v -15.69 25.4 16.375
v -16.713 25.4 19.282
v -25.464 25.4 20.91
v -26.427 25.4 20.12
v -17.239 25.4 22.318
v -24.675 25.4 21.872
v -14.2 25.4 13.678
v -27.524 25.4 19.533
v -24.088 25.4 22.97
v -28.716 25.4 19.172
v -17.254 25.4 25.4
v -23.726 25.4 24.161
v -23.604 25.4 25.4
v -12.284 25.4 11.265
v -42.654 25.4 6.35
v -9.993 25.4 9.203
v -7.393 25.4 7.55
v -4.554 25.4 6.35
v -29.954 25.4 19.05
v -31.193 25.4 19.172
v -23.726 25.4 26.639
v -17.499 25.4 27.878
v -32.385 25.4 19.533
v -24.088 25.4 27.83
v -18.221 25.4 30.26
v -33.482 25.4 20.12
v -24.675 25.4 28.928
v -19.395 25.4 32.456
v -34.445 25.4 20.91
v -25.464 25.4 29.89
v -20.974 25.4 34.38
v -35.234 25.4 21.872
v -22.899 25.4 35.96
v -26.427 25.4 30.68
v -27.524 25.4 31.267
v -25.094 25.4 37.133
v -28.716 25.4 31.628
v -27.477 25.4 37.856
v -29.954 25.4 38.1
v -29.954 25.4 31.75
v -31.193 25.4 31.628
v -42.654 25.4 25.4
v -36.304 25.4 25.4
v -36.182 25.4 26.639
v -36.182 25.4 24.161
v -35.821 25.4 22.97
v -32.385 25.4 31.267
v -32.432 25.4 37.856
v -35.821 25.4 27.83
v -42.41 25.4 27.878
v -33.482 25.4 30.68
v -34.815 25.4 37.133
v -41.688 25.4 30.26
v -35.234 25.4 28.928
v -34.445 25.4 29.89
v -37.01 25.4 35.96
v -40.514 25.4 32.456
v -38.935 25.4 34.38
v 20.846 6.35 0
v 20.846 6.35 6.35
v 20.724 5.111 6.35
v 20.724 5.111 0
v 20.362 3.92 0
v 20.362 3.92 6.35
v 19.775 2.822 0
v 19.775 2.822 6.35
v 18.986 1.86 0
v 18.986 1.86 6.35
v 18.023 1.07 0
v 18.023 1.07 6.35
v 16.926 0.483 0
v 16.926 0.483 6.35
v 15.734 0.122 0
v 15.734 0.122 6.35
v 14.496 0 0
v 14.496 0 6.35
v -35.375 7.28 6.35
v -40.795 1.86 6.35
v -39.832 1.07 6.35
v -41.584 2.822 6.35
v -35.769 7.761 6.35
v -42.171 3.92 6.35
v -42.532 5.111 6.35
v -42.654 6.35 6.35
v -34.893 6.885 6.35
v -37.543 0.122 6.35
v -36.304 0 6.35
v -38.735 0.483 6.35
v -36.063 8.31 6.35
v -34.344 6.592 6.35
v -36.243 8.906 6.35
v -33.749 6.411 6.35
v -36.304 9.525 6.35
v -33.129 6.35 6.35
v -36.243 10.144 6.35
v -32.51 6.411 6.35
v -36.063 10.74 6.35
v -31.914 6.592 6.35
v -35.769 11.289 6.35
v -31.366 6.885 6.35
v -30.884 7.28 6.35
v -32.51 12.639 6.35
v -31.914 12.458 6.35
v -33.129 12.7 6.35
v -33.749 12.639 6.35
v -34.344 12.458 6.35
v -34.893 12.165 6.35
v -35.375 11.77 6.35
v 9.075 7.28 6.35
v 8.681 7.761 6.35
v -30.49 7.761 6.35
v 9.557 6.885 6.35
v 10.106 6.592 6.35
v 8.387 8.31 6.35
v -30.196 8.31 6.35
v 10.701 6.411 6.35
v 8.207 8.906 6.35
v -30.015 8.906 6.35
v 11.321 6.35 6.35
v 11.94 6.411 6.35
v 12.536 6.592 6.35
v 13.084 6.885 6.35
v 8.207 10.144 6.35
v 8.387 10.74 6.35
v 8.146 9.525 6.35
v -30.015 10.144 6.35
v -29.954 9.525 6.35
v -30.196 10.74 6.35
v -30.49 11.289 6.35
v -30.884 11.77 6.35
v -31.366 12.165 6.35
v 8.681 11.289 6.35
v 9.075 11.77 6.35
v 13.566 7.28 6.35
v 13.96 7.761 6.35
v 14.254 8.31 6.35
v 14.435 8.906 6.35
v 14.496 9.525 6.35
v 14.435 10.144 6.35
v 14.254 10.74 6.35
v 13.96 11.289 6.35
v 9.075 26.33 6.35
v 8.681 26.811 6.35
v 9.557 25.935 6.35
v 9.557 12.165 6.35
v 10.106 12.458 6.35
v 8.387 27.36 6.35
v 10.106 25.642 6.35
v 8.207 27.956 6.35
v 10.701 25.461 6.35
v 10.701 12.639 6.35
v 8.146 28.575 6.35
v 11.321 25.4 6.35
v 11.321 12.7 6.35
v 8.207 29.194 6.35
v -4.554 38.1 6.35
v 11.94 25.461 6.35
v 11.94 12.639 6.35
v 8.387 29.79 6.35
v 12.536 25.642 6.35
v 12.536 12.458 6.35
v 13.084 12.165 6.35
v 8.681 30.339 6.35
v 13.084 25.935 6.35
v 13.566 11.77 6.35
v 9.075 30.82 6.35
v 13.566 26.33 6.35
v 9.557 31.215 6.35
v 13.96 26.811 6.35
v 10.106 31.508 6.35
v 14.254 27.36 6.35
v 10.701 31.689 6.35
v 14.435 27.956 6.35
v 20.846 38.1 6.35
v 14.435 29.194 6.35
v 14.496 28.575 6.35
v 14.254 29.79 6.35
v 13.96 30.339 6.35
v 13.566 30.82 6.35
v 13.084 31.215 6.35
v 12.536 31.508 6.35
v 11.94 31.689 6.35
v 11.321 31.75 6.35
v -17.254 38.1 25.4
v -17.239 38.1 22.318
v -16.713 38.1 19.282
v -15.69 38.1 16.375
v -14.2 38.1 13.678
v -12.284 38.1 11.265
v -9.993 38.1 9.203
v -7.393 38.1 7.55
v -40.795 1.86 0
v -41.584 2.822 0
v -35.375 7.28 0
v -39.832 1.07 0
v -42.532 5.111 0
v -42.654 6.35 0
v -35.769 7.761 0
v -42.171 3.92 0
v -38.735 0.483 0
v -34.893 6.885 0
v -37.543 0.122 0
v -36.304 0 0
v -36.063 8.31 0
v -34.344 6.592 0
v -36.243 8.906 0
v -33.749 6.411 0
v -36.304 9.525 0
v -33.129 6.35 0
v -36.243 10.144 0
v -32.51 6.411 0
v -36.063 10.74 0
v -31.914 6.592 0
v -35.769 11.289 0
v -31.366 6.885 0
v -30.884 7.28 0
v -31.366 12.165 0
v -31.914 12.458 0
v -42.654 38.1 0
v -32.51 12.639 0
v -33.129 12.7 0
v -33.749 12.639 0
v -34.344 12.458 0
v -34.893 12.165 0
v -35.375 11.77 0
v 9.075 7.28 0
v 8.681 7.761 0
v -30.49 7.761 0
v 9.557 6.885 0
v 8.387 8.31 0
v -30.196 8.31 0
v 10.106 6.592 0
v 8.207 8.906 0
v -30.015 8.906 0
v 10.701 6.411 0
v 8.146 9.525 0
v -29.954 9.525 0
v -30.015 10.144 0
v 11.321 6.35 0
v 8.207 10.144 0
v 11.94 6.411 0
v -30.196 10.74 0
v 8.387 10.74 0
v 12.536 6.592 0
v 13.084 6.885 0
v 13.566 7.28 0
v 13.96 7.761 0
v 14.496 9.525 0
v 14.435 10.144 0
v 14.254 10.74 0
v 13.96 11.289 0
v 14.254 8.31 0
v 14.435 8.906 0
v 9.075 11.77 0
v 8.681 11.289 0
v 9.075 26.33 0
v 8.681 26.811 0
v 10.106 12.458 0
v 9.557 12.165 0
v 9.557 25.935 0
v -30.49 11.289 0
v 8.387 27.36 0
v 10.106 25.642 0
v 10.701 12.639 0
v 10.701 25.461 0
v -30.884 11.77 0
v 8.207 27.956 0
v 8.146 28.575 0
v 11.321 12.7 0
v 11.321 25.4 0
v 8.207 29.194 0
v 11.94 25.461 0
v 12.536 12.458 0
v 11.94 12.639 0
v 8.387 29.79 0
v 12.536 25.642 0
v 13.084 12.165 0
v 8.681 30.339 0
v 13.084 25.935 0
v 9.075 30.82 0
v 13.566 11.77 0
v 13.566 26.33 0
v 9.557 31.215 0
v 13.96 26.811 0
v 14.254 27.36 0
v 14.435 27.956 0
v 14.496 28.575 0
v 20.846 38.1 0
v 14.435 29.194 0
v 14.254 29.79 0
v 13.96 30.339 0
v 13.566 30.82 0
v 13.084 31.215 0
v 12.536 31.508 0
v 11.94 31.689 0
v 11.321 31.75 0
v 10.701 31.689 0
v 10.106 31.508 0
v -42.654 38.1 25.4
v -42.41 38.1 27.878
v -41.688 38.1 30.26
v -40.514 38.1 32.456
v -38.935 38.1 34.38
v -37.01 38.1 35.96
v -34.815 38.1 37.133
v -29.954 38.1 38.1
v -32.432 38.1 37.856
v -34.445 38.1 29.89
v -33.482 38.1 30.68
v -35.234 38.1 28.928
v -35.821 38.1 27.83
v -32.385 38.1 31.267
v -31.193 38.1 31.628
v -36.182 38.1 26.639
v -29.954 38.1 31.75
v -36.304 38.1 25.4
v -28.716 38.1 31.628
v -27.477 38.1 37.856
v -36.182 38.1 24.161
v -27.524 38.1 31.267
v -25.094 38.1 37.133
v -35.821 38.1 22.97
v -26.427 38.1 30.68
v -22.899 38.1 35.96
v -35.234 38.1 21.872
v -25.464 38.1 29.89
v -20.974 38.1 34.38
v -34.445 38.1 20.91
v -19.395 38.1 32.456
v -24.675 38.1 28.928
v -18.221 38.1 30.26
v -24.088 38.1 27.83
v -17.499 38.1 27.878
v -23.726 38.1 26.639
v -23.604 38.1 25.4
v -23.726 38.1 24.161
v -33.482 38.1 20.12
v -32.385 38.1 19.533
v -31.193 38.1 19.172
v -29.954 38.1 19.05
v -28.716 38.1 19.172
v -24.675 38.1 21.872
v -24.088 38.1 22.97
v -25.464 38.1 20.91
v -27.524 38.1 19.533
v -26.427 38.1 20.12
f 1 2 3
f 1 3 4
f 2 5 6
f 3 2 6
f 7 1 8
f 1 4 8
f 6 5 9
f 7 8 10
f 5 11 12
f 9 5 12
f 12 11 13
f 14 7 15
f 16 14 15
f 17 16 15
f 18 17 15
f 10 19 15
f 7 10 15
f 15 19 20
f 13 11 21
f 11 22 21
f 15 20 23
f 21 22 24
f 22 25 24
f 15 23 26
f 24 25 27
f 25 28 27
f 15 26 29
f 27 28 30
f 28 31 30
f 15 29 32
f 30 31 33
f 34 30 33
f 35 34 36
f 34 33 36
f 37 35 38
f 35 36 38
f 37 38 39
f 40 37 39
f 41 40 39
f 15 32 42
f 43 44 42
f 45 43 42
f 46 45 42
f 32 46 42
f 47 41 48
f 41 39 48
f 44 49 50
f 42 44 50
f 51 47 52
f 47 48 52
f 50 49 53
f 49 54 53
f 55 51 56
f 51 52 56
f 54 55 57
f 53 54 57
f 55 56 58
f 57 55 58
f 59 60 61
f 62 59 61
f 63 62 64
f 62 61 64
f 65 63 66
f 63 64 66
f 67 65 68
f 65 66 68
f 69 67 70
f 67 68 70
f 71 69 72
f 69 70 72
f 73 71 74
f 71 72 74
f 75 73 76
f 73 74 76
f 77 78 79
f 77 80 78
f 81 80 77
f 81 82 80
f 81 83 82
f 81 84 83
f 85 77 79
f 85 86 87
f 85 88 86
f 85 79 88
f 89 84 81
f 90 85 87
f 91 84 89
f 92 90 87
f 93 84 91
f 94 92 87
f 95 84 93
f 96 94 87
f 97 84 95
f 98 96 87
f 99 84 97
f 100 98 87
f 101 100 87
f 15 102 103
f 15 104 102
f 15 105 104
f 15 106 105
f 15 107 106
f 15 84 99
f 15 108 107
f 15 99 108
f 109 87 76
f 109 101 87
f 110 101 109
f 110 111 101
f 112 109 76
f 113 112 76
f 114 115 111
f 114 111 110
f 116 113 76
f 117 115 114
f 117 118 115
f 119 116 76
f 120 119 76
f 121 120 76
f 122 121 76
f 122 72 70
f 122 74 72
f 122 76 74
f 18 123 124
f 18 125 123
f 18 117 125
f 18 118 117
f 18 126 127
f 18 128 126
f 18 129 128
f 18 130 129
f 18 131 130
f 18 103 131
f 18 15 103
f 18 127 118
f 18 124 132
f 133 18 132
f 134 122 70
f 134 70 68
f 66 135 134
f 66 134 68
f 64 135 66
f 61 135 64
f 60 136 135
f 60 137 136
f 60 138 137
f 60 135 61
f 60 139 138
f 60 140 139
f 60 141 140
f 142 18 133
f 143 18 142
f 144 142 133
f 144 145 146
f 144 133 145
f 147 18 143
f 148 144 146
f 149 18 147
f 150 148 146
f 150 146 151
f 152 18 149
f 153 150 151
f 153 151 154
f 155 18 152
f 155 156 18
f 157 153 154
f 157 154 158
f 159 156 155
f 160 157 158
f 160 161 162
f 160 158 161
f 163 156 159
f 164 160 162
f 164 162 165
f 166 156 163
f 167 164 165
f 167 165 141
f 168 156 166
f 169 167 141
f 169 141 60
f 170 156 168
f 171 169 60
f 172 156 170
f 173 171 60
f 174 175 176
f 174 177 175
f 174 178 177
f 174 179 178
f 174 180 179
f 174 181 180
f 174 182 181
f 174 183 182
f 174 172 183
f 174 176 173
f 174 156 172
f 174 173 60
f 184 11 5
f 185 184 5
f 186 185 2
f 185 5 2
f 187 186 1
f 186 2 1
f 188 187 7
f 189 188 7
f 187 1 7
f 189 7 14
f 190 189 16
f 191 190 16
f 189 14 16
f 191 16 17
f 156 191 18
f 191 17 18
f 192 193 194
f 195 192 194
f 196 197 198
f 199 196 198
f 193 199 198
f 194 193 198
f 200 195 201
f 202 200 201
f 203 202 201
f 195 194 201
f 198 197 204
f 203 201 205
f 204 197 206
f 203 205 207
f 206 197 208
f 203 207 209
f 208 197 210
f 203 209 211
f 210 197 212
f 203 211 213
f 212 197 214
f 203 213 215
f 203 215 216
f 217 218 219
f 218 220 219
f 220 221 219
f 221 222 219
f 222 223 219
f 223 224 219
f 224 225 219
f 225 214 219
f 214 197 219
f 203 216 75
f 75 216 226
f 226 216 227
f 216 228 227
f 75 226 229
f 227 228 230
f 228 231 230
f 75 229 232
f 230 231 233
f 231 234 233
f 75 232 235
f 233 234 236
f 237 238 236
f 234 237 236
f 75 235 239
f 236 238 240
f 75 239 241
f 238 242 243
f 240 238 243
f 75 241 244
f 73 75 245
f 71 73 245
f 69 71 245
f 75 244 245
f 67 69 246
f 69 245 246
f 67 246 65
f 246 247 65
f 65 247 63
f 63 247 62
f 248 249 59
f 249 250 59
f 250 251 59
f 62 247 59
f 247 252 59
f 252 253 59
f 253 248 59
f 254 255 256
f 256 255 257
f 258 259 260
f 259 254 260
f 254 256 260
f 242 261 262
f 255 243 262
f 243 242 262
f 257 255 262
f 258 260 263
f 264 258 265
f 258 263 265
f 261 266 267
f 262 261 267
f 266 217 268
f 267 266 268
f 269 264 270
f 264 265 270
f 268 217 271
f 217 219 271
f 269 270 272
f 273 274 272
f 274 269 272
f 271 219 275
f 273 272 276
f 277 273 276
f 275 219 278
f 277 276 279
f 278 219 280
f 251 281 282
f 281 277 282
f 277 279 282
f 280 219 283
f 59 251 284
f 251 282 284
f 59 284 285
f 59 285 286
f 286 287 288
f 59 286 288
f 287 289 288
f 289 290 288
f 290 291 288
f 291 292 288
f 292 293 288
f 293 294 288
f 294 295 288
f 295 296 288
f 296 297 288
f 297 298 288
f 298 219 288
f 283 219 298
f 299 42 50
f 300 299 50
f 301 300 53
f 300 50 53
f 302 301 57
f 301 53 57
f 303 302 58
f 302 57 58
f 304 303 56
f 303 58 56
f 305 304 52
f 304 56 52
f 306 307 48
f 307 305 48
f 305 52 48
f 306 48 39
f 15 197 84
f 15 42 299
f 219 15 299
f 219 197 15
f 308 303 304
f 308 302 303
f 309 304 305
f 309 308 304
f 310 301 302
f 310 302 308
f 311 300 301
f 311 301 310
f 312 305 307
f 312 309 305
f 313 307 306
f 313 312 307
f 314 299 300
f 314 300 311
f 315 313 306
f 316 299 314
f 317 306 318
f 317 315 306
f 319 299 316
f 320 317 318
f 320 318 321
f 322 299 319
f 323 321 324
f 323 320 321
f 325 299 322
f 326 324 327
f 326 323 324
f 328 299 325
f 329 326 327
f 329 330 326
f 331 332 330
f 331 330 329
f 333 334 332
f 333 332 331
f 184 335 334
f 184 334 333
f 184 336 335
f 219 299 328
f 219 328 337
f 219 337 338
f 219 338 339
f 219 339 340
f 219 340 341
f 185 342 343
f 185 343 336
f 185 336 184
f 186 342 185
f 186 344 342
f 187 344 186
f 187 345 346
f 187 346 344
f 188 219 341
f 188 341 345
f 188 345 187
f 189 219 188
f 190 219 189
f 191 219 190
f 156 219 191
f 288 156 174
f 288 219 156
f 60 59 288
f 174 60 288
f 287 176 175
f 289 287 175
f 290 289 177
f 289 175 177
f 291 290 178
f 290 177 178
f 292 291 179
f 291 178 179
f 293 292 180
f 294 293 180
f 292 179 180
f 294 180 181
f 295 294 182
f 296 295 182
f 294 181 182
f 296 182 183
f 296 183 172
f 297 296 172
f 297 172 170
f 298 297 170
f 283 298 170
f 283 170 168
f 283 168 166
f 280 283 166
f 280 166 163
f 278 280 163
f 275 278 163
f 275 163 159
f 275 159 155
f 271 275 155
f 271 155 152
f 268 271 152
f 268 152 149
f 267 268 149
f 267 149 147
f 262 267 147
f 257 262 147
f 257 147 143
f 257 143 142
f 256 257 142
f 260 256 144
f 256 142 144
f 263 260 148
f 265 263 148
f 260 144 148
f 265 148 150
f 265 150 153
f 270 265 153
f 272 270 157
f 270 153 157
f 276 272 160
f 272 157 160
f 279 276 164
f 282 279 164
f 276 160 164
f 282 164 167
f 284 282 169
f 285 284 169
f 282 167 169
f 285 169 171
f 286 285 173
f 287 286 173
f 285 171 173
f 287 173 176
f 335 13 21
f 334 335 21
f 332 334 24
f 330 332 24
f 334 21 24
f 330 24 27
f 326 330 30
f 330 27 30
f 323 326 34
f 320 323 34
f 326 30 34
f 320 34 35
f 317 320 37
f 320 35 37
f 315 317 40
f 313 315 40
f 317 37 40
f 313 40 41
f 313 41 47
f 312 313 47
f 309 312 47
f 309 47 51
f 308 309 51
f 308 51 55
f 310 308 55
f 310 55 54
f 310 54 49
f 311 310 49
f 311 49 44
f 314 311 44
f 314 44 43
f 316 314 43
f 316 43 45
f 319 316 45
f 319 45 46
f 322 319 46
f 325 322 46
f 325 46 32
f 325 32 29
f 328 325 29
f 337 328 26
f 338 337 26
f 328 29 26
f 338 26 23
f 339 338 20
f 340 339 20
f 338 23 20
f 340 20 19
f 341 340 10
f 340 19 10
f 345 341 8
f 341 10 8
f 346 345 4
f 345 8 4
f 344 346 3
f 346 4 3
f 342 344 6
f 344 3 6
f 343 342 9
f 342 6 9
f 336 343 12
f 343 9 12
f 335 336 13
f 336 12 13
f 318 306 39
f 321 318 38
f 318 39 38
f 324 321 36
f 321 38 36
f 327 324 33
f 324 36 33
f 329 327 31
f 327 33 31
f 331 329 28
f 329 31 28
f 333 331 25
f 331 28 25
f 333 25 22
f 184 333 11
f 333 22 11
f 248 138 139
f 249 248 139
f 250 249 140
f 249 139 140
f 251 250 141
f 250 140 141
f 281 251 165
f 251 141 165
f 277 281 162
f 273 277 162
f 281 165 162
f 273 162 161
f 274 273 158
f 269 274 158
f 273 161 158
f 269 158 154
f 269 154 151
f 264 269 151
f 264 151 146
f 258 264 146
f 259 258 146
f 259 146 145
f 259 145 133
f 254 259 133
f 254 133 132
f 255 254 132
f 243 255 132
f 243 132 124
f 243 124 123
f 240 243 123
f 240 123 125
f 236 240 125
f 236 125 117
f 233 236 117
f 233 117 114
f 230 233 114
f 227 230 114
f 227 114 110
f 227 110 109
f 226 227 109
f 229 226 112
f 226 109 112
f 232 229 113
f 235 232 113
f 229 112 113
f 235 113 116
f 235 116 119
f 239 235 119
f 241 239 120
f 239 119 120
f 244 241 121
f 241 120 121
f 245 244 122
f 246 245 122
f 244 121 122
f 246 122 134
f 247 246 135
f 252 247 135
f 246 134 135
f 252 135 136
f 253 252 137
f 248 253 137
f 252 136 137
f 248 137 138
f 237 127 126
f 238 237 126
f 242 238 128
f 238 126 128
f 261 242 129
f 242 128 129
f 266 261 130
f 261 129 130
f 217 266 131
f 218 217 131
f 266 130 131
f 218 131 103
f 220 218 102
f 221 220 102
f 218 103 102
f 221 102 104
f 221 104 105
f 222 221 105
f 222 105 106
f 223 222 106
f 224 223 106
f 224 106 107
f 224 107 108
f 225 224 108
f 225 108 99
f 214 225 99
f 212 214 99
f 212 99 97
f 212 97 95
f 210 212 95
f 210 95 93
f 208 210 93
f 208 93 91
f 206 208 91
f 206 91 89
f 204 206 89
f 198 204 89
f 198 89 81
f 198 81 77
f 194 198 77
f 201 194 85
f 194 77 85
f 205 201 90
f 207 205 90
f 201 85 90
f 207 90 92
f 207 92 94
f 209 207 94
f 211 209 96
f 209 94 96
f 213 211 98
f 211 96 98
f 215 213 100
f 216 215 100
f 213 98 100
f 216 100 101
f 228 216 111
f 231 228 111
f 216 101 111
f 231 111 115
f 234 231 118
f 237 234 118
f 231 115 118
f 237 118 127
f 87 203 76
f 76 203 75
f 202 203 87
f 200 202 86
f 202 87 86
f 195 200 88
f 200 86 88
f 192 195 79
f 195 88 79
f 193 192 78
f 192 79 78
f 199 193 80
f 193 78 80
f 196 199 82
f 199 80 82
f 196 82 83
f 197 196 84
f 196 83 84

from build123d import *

# Parameters (mm, degrees)
F0_W      = 63.5
F0_H      = 38.1
F1_DEPTH  = 38.1
F3_DEPTH  = 31.75
F4_R      = 6.35
F5_DEPTH  = 44.45
F6_R      = 3.175
F7_DEPTH  = 25.4
F9_DEPTH  = 25.4
F11_DEPTH = 25.4


# Not quite as in the source:
# - a length typed as a fraction of an inch, garbled in the dataset ("3 / 203.2 mm" for 3/8 in), is restored


with BuildPart() as f1:
    # F0 (on Top) → F1 (new body)
    with BuildSketch(Plane.XY):
        with Locations((-10.9044740348, 19.05)):
            Rectangle(F0_W, F0_H)
    extrude(amount=F1_DEPTH)

    # F2 (on face) → F3 (cut)
    with BuildSketch(Plane.XY.offset(38.1)):
        Polygon((-4.5544740348, 25.4), (-42.6544740348, 25.4), (-42.6544740348, 0), (20.8455259652, 0), (20.8455259652, 38.1), (-4.5544740348, 38.1), align=None)
    extrude(amount=-F3_DEPTH, mode=Mode.SUBTRACT)

    # F4 (on face) → F5 (cut)
    with BuildSketch(Plane.XZ.offset(-25.4)):
        with Locations((-29.9544740348, 25.4)):
            Circle(F4_R)
        with BuildLine():
            ThreePointArc((-42.6544740348, 25.4), (-38.9347301559, 34.3802561211), (-29.9544740348, 38.1))
            Line((-29.9544740348, 38.1), (-42.6544740348, 38.1))
            Line((-42.6544740348, 38.1), (-42.6544740348, 25.4))
        make_face()
        with BuildLine():
            ThreePointArc((-29.9544740348, 38.1), (-20.9742179137, 34.3802561211), (-17.2544740348, 25.4))
            ThreePointArc((-17.2544740348, 25.4), (-14.2002037714, 13.6778468423), (-4.5544740348, 6.35))
            Line((-4.5544740348, 6.35), (-4.5544740348, 38.1))
            Line((-4.5544740348, 38.1), (-29.9544740348, 38.1))
        make_face()
    extrude(amount=-F5_DEPTH, mode=Mode.SUBTRACT)

    # F6 (on face) → F7 (cut)
    with BuildSketch(Plane.XY.offset(6.35)):
        with Locations((11.3205259652, 9.525)):
            Circle(F6_R)
        with Locations((-33.1294740348, 9.525)):
            Circle(F6_R)
        with Locations((11.3205259652, 28.575)):
            Circle(F6_R)
    extrude(amount=-F7_DEPTH, mode=Mode.SUBTRACT)

    # F8 (on face) → F9 (cut)
    with BuildSketch(Plane.XY.offset(6.35)):
        with BuildLine():
            ThreePointArc((-36.3044740348, 0), (-40.7946020953, 1.8598719395), (-42.6544740348, 6.35))
            Line((-42.6544740348, 6.35), (-42.6544740348, 0))
            Line((-42.6544740348, 0), (-36.3044740348, 0))
        make_face()
    extrude(amount=-F9_DEPTH, mode=Mode.SUBTRACT)

    # F10 (on face) → F11 (cut)
    with BuildSketch(Plane.XY.offset(6.35)):
        with BuildLine():
            Line((20.8455259652, 0), (20.8455259652, 6.35))
            ThreePointArc((20.8455259652, 6.35), (18.9856540257, 1.8598719395), (14.4955259652, 0))
            Line((14.4955259652, 0), (20.8455259652, 0))
        make_face()
    extrude(amount=-F11_DEPTH, mode=Mode.SUBTRACT)


solid = f1.part
